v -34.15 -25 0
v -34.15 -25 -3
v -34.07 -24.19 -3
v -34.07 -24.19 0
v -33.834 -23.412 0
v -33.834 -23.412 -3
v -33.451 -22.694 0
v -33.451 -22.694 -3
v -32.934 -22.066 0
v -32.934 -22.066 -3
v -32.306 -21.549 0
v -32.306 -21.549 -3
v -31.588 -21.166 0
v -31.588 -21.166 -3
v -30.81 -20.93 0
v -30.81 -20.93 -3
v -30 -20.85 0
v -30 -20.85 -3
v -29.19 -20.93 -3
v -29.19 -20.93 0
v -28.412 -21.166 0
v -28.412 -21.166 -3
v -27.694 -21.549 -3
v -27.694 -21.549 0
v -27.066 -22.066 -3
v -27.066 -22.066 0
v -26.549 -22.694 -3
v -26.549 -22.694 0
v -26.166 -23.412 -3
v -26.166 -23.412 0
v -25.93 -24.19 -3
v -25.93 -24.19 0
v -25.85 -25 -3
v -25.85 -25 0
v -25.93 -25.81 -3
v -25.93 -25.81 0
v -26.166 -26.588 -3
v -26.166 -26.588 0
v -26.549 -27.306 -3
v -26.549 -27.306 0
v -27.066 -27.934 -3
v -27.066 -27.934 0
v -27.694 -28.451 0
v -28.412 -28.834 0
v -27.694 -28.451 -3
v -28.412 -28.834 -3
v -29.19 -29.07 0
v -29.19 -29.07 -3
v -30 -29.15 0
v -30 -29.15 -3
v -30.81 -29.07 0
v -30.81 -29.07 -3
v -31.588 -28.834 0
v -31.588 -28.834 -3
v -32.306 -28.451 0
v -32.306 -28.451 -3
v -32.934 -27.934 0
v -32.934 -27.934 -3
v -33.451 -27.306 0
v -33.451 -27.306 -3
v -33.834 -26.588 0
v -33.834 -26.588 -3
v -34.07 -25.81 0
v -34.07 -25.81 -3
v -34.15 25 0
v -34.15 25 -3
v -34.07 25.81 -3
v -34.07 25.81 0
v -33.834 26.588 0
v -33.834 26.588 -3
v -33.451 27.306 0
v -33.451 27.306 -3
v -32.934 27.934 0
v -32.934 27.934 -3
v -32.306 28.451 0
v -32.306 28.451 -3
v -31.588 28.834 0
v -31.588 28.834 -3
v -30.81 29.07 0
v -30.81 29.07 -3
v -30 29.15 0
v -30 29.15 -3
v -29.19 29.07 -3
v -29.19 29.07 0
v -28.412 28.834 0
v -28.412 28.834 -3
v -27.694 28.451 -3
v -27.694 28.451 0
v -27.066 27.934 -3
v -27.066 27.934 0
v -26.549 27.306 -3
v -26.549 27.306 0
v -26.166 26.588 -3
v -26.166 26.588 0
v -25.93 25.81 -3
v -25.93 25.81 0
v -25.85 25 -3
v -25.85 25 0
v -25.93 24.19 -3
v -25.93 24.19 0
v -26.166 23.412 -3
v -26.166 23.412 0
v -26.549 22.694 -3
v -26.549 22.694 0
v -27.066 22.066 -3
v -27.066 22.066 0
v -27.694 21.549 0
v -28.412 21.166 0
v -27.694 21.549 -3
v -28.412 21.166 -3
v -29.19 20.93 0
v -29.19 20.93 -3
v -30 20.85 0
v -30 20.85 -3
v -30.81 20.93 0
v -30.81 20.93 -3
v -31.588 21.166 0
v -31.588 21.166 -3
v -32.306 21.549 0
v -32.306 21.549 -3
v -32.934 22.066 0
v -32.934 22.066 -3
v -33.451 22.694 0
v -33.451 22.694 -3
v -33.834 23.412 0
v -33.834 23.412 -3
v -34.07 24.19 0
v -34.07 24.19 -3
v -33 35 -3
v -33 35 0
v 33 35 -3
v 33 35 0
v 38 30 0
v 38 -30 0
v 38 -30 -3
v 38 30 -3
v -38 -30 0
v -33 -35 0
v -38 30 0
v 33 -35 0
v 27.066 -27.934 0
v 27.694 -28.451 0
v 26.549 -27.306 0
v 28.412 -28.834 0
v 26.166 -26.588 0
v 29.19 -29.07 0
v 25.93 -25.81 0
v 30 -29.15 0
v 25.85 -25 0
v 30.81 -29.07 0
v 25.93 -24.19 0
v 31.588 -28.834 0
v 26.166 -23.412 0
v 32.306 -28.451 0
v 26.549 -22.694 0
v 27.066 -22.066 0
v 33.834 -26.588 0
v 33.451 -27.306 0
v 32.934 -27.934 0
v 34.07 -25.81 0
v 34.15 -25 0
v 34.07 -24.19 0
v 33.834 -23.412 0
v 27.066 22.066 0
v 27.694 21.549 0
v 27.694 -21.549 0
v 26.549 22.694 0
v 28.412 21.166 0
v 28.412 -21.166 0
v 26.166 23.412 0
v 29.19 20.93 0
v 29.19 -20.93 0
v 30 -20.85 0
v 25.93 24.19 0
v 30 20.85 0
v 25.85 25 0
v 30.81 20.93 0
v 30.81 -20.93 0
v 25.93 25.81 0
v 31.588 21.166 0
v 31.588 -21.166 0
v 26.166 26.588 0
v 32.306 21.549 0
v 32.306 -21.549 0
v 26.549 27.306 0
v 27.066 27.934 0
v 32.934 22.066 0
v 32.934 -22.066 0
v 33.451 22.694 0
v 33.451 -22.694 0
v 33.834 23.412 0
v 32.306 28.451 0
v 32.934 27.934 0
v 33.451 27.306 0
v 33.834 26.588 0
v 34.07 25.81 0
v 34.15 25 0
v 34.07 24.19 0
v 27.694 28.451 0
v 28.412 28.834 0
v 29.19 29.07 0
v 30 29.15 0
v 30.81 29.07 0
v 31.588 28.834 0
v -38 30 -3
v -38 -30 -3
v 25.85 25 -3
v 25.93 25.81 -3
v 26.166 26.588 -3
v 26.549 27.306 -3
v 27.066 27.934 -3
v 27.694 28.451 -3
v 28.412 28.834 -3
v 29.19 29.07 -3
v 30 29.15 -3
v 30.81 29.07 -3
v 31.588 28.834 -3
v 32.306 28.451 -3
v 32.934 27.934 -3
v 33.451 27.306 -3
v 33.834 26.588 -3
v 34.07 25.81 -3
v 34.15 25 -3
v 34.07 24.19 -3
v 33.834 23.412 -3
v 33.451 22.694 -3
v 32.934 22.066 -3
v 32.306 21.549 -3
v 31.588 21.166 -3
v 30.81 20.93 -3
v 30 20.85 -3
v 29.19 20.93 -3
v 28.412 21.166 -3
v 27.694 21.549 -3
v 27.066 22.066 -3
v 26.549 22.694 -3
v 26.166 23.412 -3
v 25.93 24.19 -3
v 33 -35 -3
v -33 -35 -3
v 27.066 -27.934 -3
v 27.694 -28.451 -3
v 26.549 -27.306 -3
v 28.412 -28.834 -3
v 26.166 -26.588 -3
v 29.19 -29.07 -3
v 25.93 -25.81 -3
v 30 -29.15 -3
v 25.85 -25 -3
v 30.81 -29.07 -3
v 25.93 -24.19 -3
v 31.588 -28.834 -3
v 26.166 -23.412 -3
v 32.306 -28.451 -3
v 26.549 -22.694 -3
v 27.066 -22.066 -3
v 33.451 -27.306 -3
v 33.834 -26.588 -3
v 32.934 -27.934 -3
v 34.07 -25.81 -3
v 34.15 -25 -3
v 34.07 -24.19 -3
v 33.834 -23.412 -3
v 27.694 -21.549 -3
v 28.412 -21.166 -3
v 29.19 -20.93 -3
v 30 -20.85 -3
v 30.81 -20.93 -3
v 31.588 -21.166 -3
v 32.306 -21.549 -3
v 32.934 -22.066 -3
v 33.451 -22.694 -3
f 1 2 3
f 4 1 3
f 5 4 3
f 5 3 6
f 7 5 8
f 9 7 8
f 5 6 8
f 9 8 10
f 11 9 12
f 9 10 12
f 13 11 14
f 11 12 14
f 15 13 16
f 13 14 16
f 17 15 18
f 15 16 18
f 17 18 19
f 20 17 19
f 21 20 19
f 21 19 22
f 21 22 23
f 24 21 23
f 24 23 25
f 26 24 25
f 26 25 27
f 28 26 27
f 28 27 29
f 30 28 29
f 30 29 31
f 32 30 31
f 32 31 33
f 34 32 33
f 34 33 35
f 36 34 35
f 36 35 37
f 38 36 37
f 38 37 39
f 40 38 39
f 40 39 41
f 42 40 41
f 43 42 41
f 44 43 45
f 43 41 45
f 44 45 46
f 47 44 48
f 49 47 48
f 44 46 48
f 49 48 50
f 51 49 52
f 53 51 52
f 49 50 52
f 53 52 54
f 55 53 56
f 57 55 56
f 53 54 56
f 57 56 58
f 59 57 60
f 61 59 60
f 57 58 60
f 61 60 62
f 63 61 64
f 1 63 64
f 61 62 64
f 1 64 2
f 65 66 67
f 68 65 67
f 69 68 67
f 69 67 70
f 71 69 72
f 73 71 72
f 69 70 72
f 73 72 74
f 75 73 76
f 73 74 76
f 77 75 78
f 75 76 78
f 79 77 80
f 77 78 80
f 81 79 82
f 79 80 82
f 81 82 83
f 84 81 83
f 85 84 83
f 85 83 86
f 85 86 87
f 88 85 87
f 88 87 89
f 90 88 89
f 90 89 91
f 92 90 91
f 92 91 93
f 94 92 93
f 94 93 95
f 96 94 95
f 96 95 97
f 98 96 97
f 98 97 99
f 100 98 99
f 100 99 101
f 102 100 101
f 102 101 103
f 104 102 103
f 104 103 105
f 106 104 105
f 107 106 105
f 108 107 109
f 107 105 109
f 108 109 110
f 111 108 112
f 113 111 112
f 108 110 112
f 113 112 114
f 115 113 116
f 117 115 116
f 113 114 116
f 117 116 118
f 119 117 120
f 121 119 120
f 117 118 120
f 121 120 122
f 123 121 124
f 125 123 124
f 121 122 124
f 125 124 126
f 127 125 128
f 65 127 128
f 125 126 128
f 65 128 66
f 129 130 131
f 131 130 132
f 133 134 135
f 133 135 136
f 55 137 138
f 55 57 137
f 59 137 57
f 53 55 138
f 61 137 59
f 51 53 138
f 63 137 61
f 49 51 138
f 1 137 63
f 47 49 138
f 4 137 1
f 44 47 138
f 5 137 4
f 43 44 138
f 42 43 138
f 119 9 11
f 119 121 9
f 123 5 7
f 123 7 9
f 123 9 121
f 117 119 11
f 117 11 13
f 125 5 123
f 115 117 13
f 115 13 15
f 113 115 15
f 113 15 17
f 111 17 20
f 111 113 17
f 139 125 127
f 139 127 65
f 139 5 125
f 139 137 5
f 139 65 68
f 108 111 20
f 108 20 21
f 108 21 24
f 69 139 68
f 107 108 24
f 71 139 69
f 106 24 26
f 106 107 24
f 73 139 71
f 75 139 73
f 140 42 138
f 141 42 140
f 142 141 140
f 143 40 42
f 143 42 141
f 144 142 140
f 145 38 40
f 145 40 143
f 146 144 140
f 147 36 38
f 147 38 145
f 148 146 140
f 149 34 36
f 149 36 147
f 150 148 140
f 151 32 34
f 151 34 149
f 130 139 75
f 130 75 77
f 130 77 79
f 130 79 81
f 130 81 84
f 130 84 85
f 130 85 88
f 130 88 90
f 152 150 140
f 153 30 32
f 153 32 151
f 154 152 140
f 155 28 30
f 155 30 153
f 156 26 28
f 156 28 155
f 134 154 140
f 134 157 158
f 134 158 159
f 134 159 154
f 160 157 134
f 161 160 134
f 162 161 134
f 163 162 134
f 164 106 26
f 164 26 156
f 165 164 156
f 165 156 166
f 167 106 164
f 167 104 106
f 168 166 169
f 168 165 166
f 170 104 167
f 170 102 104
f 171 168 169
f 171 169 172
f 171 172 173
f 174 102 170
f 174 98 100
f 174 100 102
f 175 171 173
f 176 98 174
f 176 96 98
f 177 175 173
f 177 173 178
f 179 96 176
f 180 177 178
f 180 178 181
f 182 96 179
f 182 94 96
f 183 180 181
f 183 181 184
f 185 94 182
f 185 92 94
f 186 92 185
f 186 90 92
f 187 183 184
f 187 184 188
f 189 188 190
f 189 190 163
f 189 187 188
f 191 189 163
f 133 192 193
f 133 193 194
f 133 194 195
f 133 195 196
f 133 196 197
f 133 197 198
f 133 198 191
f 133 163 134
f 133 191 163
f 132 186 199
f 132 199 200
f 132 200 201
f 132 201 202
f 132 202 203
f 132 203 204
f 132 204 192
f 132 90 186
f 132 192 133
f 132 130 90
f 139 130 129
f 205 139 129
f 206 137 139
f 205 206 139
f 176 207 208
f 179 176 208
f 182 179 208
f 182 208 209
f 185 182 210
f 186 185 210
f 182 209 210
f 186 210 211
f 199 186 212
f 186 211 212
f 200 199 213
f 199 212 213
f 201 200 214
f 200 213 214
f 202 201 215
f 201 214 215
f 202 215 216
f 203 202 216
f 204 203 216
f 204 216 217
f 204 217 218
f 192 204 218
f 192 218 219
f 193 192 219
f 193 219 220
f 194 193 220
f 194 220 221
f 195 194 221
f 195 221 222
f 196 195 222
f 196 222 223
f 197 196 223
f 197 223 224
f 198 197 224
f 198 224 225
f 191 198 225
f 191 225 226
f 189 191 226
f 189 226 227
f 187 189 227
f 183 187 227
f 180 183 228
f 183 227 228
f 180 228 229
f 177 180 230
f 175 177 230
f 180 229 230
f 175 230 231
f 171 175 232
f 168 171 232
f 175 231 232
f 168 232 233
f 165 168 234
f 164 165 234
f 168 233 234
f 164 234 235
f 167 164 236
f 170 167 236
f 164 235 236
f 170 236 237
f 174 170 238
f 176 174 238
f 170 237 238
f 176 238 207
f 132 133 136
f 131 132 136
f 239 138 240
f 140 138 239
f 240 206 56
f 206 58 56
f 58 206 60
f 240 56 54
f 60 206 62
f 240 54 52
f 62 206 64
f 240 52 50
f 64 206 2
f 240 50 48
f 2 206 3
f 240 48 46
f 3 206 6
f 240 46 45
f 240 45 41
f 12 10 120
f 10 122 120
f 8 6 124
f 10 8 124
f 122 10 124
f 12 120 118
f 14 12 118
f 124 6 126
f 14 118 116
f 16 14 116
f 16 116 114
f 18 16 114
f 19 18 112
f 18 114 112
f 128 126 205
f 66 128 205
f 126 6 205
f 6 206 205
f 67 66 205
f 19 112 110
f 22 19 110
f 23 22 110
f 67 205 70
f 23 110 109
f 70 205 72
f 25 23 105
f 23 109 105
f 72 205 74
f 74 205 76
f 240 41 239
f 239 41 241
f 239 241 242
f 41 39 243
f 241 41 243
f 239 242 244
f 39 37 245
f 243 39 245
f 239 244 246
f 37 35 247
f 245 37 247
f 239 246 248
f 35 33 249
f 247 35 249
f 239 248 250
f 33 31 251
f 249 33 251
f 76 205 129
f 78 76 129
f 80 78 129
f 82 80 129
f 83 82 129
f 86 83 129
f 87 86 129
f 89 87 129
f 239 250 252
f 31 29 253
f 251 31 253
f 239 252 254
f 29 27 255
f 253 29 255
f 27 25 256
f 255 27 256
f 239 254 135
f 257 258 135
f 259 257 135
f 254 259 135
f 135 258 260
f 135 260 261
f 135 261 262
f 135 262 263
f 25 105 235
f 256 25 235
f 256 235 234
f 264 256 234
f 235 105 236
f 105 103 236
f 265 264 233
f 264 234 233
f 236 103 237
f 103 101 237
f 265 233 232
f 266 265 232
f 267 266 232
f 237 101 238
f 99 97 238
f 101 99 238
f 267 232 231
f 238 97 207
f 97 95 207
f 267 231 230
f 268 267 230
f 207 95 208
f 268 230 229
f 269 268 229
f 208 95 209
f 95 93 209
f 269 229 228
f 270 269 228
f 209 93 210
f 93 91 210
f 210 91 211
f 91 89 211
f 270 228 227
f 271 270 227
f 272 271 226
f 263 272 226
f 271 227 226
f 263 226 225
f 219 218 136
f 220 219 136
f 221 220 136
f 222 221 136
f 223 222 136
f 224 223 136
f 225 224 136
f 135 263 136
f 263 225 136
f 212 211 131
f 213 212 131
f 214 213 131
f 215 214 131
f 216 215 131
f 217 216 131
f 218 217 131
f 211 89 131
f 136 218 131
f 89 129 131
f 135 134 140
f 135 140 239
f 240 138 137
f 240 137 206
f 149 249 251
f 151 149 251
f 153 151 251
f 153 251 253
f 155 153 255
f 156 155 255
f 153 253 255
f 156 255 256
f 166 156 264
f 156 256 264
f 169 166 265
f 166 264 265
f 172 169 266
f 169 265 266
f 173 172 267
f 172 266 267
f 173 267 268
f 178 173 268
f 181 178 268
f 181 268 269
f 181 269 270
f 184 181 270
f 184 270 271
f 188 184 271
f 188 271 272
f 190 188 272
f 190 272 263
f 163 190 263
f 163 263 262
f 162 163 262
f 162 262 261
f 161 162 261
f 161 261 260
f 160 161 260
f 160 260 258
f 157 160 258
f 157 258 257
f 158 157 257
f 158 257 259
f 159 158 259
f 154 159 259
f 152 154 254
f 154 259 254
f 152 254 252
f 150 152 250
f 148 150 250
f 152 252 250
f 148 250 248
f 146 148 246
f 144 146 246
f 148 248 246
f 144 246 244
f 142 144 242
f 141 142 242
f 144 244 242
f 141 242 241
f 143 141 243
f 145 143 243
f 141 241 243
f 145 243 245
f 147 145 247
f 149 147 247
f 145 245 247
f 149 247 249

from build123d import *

# Parameters (mm, degrees)
F0_W     = 76
F0_H     = 70
F1_DEPTH = 3
F3_D     = 8.3
F4_SIZE  = 5


with BuildPart() as f1:
    # F0 (on Top) → F1 (new body)
    with BuildSketch(Plane.XY):
        Rectangle(F0_W, F0_H)
    extrude(amount=-F1_DEPTH)

    # F3 (through all)
    with Locations(Plane.XY):
        with Locations((-30, 25), (30, 25), (30, -25), (-30, -25)):
            Hole(F3_D / 2)

    # F4
    f4_edges = [f1.edges().sort_by_distance(p)[0] for p in [
        (-38, 35, -1.5),
        (-38, -35, -1.5),
        (38, -35, -1.5),
        (38, 35, -1.5),
    ]]
    chamfer(f4_edges, length=F4_SIZE)


solid = f1.part
